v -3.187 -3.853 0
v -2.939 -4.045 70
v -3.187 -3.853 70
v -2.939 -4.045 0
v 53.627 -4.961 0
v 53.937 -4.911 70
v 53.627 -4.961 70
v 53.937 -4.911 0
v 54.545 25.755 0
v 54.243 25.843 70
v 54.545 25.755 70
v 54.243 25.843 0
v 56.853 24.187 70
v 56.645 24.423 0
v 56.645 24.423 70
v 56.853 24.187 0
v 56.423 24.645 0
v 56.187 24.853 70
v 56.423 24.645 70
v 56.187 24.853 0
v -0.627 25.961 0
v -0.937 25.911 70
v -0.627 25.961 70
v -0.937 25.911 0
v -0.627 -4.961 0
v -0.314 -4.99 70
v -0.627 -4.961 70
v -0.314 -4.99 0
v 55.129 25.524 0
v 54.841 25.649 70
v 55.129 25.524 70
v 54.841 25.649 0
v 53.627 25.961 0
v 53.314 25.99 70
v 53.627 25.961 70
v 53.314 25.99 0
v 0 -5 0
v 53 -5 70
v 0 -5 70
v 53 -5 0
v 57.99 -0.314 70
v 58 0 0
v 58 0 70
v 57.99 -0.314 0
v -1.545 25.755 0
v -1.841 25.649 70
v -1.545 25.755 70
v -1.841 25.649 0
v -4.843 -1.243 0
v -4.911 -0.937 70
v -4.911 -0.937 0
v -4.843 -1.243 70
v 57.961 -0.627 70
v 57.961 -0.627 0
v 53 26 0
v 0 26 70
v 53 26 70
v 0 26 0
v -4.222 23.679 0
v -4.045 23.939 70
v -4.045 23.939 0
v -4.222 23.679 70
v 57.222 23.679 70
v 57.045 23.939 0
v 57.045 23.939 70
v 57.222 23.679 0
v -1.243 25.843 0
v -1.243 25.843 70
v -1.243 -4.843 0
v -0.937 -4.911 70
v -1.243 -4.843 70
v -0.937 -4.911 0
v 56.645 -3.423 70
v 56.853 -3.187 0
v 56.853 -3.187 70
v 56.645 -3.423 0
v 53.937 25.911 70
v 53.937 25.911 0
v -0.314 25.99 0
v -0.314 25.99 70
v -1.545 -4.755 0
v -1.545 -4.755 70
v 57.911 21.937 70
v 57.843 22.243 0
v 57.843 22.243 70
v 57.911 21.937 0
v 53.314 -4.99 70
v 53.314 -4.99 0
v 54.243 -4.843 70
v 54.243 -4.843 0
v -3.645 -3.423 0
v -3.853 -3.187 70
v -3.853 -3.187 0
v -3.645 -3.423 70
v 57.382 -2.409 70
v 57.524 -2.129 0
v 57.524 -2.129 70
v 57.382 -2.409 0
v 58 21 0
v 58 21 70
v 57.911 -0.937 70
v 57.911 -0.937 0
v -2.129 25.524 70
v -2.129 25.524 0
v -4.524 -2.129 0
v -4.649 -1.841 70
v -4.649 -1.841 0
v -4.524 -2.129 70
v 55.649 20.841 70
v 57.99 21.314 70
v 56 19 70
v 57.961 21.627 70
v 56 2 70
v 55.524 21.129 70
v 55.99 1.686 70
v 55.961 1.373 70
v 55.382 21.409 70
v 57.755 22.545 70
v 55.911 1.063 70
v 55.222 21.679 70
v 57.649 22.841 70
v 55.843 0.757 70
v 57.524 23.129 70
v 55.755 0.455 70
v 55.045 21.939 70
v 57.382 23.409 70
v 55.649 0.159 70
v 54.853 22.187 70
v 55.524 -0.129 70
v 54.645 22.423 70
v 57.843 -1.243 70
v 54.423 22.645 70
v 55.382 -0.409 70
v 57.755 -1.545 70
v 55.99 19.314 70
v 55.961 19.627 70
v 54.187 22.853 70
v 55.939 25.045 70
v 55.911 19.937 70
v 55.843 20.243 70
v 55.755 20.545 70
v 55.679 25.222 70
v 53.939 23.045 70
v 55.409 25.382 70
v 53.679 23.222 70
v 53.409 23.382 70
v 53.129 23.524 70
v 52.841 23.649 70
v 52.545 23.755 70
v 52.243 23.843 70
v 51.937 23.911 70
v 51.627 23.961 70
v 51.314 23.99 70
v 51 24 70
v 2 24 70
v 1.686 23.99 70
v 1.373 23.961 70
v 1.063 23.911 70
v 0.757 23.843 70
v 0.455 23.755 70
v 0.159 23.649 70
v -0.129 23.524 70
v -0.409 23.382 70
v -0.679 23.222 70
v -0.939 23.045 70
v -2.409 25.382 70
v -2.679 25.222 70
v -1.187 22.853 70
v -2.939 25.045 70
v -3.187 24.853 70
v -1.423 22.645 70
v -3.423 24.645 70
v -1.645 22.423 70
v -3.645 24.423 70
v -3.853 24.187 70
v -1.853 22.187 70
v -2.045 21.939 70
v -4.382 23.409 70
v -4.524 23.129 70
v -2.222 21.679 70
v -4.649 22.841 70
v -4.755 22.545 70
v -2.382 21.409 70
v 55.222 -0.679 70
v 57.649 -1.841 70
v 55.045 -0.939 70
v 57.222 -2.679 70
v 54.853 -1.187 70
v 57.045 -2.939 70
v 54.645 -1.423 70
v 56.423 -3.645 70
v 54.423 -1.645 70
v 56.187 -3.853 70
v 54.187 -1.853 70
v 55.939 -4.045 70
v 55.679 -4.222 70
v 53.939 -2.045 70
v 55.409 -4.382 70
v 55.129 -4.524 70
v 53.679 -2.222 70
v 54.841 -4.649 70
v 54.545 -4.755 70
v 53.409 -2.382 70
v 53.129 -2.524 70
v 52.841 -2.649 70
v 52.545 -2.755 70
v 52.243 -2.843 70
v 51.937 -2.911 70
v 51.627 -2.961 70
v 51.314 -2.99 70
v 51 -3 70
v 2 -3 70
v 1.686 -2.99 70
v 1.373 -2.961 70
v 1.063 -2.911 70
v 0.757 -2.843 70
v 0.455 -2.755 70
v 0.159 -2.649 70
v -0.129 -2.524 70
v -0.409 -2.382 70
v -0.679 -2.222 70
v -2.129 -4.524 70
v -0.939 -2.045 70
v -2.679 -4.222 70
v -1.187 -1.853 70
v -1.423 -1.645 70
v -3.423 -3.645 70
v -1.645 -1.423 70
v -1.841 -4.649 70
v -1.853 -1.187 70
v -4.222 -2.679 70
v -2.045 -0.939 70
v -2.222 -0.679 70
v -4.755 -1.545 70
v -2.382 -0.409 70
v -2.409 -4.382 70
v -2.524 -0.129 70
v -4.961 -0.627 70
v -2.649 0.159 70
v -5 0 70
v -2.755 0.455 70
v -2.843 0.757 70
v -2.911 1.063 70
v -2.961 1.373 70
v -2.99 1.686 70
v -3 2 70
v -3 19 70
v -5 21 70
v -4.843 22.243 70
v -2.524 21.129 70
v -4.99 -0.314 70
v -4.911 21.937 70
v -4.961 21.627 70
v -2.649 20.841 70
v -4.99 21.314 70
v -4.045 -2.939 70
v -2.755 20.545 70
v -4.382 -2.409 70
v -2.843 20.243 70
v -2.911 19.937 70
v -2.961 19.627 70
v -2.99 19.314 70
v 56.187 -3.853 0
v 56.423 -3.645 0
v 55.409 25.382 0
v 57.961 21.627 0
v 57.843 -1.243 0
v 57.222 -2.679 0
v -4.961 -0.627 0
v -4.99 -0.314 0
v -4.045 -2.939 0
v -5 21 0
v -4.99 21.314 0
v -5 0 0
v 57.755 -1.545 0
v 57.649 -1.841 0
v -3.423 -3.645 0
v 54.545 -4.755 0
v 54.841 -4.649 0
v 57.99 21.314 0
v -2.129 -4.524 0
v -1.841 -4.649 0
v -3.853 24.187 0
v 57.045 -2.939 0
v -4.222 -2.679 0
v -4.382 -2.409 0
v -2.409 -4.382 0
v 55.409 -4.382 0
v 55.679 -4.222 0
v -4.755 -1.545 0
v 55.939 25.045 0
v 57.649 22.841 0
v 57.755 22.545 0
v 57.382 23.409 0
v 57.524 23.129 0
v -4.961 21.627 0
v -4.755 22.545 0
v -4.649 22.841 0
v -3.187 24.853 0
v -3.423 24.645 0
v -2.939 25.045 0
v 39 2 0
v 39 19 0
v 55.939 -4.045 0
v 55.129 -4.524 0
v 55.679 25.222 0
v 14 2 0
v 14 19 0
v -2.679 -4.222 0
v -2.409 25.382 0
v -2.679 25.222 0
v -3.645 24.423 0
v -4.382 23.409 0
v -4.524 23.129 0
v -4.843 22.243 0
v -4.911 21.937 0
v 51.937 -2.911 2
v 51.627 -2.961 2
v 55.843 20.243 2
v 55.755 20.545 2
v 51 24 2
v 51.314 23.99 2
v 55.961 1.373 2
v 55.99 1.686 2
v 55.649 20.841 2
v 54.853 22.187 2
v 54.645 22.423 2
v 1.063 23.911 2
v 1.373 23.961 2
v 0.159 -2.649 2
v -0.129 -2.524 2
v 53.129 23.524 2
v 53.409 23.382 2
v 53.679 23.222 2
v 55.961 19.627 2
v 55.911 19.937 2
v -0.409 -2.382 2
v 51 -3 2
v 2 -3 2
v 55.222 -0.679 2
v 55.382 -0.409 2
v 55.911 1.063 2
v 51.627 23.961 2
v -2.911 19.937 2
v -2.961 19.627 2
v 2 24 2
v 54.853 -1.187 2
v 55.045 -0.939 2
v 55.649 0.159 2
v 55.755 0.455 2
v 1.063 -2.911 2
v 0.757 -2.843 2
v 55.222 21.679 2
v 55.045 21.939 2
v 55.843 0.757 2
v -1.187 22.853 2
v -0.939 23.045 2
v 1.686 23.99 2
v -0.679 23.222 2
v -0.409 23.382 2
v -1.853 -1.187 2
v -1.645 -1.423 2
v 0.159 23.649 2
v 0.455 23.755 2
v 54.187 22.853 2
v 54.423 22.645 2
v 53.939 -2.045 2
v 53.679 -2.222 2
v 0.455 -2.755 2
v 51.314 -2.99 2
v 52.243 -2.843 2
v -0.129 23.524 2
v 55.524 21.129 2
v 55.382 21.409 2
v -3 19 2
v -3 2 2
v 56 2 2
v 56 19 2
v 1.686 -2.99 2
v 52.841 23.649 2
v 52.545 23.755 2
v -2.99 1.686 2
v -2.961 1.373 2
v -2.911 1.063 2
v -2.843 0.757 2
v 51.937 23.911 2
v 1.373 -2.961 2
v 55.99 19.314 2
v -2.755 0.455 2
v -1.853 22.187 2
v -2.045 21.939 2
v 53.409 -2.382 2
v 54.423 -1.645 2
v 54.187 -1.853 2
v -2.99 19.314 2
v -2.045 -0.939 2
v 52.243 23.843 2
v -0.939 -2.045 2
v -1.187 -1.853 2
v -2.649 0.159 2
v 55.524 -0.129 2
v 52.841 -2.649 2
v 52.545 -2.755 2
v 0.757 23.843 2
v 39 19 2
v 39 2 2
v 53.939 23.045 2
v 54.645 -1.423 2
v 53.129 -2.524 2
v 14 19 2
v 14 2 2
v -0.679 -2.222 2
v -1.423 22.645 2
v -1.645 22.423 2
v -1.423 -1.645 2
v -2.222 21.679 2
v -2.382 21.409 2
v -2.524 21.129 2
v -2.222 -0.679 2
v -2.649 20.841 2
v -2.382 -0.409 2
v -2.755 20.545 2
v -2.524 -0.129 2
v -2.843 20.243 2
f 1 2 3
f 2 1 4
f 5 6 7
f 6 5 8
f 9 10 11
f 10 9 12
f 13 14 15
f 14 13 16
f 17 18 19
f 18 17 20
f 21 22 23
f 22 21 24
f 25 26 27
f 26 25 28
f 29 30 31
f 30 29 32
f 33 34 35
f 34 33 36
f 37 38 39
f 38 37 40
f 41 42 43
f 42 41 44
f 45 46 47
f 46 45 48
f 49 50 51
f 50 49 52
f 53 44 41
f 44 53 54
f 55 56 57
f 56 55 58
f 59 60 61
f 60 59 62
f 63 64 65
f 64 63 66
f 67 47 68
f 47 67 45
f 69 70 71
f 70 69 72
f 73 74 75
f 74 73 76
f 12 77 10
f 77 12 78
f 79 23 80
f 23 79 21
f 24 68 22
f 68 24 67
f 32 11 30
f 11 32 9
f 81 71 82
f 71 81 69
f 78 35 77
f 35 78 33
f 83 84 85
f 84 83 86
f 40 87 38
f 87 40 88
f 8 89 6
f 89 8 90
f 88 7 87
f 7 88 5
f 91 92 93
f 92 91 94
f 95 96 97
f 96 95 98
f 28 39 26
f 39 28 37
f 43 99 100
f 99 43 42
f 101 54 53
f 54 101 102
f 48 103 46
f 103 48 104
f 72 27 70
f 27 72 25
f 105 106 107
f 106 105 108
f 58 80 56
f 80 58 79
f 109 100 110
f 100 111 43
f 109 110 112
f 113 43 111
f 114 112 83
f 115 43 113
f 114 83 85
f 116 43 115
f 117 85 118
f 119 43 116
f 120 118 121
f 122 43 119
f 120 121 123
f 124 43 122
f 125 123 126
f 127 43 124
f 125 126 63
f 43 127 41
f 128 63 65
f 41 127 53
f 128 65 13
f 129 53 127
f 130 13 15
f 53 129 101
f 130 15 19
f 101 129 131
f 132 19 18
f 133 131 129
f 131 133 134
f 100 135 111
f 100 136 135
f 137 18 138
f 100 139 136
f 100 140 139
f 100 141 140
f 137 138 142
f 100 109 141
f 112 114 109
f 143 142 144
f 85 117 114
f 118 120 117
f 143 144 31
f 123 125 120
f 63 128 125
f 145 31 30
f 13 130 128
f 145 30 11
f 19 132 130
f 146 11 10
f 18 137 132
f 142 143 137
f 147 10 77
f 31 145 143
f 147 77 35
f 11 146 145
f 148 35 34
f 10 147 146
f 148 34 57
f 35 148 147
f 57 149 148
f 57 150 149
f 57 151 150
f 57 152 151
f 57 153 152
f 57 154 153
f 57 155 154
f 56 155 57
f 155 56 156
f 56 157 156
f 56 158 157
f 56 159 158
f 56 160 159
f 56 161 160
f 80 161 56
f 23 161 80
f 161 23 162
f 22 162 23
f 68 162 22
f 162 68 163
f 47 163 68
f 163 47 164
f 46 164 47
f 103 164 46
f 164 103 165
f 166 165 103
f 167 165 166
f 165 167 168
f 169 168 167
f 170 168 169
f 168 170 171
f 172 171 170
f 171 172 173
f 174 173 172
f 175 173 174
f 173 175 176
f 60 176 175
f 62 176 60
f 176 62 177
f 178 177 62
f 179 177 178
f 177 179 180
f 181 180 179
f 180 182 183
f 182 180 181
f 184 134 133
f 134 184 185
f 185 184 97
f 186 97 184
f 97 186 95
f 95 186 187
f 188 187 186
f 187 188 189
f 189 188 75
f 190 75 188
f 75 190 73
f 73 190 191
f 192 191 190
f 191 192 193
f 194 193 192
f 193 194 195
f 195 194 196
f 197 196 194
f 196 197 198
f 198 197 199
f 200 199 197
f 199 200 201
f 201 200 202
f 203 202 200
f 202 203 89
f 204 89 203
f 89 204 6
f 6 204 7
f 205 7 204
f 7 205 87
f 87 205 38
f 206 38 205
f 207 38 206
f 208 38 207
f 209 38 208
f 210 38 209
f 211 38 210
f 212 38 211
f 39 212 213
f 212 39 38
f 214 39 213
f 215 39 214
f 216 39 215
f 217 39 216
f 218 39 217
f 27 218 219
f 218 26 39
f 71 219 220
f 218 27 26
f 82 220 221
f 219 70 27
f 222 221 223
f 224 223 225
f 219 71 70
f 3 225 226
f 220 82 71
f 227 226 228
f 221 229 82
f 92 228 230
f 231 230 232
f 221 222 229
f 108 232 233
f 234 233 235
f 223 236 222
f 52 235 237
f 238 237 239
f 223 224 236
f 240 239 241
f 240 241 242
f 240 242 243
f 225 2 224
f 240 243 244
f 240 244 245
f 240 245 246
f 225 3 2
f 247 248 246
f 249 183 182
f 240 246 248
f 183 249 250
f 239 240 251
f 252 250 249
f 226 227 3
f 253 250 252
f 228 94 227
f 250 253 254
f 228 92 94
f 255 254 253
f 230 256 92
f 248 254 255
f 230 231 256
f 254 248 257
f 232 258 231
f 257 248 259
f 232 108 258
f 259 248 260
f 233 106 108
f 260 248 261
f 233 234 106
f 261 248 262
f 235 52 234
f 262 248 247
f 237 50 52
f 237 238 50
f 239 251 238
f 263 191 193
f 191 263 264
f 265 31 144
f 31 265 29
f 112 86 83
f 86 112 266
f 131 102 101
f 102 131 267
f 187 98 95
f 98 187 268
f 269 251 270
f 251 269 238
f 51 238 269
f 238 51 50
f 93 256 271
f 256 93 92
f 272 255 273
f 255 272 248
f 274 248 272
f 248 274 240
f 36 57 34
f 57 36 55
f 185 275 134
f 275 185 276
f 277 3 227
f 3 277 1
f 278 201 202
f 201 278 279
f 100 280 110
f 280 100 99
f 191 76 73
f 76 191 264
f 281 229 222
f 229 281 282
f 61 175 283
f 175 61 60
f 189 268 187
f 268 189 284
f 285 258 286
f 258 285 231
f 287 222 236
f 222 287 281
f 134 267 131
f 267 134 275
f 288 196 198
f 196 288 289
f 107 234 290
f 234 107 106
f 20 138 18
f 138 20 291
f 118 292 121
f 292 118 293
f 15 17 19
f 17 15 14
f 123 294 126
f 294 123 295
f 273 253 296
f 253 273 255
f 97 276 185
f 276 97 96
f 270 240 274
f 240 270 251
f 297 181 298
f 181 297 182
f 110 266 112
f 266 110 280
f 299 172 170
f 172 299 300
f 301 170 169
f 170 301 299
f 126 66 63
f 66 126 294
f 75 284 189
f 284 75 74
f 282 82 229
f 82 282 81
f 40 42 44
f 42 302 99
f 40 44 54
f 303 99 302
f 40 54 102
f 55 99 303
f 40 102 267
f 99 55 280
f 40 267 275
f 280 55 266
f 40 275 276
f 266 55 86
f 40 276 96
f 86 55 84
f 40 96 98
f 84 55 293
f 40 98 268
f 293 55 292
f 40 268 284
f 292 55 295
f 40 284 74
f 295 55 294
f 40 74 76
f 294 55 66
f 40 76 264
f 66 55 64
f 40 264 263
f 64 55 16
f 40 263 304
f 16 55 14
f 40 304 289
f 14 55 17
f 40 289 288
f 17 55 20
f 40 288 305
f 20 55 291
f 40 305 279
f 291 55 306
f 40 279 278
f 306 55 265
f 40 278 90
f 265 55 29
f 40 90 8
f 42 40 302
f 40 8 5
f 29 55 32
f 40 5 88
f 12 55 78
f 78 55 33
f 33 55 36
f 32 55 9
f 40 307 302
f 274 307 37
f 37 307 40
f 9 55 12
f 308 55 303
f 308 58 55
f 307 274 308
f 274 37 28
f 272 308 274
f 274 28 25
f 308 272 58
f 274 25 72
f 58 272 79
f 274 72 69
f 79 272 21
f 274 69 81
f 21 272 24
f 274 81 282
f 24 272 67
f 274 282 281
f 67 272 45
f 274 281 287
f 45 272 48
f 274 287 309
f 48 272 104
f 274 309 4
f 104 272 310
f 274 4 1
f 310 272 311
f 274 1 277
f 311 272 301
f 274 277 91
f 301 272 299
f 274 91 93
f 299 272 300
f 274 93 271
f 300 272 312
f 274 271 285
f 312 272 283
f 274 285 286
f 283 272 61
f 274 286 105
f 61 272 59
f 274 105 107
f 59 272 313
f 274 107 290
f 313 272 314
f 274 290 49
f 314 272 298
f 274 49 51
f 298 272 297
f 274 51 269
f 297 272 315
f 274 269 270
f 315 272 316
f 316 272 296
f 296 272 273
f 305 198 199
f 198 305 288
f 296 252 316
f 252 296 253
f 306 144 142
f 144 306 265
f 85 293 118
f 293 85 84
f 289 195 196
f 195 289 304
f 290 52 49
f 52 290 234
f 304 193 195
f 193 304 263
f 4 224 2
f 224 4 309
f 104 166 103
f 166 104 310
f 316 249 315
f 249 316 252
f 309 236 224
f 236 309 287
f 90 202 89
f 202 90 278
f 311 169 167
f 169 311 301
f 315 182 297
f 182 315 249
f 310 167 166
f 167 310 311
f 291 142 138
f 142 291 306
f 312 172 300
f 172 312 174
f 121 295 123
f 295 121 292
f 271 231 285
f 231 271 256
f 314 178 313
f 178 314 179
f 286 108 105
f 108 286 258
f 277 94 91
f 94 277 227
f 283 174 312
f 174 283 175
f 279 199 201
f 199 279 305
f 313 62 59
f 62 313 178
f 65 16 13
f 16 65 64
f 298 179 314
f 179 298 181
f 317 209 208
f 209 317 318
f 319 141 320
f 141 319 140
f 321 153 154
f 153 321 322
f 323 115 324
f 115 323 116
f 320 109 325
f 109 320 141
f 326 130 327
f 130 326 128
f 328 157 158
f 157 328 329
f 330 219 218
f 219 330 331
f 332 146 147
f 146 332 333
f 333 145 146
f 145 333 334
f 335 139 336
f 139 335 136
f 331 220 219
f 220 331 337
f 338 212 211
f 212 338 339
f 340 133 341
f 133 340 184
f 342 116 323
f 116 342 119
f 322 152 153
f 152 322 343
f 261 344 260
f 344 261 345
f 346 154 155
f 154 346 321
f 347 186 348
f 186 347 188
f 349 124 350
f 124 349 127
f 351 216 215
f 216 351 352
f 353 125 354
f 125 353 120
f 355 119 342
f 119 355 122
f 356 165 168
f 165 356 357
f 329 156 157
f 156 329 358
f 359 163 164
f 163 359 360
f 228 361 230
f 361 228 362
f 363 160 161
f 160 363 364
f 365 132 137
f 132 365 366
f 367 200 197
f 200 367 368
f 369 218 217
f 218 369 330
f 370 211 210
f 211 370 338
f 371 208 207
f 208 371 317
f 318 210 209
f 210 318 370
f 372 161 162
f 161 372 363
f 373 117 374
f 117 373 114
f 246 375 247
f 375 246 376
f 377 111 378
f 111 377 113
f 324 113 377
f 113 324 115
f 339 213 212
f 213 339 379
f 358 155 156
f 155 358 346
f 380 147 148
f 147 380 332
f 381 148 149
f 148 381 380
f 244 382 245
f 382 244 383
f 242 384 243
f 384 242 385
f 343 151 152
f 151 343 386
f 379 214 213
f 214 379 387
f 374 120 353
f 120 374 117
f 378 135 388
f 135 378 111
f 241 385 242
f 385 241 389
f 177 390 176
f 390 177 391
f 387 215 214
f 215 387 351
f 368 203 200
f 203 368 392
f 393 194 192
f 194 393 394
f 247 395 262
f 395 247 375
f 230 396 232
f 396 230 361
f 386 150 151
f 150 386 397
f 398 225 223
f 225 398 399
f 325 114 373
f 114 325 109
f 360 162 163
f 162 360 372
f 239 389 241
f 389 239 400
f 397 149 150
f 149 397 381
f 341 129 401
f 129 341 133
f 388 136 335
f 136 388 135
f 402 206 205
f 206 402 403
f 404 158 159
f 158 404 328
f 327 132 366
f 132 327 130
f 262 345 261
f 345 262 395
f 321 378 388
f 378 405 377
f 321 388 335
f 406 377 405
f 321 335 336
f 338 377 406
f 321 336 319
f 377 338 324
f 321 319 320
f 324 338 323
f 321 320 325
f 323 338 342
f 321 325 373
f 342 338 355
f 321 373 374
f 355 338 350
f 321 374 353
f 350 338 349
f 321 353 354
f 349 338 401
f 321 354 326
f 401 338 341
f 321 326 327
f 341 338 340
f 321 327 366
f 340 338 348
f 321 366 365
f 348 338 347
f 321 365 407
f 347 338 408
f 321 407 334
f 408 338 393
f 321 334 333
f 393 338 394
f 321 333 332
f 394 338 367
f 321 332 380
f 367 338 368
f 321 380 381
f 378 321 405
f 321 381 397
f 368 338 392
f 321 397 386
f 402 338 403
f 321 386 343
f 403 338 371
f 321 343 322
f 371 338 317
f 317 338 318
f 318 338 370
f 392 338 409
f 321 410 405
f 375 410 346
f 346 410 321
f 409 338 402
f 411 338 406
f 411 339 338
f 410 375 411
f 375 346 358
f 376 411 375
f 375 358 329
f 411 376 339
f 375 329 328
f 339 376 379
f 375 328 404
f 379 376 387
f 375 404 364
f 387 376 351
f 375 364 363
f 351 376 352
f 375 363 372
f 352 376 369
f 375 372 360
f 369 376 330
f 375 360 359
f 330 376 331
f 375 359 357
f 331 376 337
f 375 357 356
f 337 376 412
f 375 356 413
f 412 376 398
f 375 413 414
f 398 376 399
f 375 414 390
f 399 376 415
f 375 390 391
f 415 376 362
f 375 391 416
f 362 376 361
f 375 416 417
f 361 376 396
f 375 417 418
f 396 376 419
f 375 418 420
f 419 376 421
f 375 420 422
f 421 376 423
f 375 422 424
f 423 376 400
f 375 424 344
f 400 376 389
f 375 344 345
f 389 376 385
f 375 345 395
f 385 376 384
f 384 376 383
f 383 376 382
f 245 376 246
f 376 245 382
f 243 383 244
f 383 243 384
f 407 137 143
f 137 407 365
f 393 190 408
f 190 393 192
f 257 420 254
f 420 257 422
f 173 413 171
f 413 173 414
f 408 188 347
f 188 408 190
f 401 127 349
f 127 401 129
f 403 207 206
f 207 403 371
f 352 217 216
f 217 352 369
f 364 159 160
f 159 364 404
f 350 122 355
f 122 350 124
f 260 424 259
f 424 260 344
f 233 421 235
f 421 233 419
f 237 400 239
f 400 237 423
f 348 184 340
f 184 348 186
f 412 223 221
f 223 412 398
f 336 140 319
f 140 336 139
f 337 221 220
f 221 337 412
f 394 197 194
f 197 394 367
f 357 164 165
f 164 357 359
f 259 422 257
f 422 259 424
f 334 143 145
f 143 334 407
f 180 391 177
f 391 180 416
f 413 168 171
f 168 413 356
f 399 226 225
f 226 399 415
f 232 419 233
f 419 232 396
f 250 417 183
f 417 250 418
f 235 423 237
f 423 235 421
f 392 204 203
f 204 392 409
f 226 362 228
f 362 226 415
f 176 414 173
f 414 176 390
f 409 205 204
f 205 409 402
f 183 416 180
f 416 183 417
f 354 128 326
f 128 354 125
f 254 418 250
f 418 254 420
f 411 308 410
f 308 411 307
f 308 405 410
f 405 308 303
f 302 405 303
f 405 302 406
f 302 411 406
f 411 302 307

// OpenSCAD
$fn=100;

depth=27;
width=59;
height=70;
corner_radius=5;
wall=2;
plug_width=25;
plug_depth=17;
plug_radius=3;

difference(){
    linear_extrude(height) {
        offset(corner_radius) { 
            square([(width+(wall*2))-(corner_radius*2),(depth+(wall*2))-(corner_radius*2)]);
        }
    }
    translate([wall,wall,wall])
        linear_extrude(height-wall) {
            offset(corner_radius) { 
                square([width-(corner_radius*2),depth-(corner_radius*2)]);
            }
        }
    translate([wall-corner_radius+((width-plug_width)/2),wall-corner_radius+((depth-plug_depth)/2),0])
        linear_extrude(wall) {
                square([plug_width,plug_depth]);
        }
}
